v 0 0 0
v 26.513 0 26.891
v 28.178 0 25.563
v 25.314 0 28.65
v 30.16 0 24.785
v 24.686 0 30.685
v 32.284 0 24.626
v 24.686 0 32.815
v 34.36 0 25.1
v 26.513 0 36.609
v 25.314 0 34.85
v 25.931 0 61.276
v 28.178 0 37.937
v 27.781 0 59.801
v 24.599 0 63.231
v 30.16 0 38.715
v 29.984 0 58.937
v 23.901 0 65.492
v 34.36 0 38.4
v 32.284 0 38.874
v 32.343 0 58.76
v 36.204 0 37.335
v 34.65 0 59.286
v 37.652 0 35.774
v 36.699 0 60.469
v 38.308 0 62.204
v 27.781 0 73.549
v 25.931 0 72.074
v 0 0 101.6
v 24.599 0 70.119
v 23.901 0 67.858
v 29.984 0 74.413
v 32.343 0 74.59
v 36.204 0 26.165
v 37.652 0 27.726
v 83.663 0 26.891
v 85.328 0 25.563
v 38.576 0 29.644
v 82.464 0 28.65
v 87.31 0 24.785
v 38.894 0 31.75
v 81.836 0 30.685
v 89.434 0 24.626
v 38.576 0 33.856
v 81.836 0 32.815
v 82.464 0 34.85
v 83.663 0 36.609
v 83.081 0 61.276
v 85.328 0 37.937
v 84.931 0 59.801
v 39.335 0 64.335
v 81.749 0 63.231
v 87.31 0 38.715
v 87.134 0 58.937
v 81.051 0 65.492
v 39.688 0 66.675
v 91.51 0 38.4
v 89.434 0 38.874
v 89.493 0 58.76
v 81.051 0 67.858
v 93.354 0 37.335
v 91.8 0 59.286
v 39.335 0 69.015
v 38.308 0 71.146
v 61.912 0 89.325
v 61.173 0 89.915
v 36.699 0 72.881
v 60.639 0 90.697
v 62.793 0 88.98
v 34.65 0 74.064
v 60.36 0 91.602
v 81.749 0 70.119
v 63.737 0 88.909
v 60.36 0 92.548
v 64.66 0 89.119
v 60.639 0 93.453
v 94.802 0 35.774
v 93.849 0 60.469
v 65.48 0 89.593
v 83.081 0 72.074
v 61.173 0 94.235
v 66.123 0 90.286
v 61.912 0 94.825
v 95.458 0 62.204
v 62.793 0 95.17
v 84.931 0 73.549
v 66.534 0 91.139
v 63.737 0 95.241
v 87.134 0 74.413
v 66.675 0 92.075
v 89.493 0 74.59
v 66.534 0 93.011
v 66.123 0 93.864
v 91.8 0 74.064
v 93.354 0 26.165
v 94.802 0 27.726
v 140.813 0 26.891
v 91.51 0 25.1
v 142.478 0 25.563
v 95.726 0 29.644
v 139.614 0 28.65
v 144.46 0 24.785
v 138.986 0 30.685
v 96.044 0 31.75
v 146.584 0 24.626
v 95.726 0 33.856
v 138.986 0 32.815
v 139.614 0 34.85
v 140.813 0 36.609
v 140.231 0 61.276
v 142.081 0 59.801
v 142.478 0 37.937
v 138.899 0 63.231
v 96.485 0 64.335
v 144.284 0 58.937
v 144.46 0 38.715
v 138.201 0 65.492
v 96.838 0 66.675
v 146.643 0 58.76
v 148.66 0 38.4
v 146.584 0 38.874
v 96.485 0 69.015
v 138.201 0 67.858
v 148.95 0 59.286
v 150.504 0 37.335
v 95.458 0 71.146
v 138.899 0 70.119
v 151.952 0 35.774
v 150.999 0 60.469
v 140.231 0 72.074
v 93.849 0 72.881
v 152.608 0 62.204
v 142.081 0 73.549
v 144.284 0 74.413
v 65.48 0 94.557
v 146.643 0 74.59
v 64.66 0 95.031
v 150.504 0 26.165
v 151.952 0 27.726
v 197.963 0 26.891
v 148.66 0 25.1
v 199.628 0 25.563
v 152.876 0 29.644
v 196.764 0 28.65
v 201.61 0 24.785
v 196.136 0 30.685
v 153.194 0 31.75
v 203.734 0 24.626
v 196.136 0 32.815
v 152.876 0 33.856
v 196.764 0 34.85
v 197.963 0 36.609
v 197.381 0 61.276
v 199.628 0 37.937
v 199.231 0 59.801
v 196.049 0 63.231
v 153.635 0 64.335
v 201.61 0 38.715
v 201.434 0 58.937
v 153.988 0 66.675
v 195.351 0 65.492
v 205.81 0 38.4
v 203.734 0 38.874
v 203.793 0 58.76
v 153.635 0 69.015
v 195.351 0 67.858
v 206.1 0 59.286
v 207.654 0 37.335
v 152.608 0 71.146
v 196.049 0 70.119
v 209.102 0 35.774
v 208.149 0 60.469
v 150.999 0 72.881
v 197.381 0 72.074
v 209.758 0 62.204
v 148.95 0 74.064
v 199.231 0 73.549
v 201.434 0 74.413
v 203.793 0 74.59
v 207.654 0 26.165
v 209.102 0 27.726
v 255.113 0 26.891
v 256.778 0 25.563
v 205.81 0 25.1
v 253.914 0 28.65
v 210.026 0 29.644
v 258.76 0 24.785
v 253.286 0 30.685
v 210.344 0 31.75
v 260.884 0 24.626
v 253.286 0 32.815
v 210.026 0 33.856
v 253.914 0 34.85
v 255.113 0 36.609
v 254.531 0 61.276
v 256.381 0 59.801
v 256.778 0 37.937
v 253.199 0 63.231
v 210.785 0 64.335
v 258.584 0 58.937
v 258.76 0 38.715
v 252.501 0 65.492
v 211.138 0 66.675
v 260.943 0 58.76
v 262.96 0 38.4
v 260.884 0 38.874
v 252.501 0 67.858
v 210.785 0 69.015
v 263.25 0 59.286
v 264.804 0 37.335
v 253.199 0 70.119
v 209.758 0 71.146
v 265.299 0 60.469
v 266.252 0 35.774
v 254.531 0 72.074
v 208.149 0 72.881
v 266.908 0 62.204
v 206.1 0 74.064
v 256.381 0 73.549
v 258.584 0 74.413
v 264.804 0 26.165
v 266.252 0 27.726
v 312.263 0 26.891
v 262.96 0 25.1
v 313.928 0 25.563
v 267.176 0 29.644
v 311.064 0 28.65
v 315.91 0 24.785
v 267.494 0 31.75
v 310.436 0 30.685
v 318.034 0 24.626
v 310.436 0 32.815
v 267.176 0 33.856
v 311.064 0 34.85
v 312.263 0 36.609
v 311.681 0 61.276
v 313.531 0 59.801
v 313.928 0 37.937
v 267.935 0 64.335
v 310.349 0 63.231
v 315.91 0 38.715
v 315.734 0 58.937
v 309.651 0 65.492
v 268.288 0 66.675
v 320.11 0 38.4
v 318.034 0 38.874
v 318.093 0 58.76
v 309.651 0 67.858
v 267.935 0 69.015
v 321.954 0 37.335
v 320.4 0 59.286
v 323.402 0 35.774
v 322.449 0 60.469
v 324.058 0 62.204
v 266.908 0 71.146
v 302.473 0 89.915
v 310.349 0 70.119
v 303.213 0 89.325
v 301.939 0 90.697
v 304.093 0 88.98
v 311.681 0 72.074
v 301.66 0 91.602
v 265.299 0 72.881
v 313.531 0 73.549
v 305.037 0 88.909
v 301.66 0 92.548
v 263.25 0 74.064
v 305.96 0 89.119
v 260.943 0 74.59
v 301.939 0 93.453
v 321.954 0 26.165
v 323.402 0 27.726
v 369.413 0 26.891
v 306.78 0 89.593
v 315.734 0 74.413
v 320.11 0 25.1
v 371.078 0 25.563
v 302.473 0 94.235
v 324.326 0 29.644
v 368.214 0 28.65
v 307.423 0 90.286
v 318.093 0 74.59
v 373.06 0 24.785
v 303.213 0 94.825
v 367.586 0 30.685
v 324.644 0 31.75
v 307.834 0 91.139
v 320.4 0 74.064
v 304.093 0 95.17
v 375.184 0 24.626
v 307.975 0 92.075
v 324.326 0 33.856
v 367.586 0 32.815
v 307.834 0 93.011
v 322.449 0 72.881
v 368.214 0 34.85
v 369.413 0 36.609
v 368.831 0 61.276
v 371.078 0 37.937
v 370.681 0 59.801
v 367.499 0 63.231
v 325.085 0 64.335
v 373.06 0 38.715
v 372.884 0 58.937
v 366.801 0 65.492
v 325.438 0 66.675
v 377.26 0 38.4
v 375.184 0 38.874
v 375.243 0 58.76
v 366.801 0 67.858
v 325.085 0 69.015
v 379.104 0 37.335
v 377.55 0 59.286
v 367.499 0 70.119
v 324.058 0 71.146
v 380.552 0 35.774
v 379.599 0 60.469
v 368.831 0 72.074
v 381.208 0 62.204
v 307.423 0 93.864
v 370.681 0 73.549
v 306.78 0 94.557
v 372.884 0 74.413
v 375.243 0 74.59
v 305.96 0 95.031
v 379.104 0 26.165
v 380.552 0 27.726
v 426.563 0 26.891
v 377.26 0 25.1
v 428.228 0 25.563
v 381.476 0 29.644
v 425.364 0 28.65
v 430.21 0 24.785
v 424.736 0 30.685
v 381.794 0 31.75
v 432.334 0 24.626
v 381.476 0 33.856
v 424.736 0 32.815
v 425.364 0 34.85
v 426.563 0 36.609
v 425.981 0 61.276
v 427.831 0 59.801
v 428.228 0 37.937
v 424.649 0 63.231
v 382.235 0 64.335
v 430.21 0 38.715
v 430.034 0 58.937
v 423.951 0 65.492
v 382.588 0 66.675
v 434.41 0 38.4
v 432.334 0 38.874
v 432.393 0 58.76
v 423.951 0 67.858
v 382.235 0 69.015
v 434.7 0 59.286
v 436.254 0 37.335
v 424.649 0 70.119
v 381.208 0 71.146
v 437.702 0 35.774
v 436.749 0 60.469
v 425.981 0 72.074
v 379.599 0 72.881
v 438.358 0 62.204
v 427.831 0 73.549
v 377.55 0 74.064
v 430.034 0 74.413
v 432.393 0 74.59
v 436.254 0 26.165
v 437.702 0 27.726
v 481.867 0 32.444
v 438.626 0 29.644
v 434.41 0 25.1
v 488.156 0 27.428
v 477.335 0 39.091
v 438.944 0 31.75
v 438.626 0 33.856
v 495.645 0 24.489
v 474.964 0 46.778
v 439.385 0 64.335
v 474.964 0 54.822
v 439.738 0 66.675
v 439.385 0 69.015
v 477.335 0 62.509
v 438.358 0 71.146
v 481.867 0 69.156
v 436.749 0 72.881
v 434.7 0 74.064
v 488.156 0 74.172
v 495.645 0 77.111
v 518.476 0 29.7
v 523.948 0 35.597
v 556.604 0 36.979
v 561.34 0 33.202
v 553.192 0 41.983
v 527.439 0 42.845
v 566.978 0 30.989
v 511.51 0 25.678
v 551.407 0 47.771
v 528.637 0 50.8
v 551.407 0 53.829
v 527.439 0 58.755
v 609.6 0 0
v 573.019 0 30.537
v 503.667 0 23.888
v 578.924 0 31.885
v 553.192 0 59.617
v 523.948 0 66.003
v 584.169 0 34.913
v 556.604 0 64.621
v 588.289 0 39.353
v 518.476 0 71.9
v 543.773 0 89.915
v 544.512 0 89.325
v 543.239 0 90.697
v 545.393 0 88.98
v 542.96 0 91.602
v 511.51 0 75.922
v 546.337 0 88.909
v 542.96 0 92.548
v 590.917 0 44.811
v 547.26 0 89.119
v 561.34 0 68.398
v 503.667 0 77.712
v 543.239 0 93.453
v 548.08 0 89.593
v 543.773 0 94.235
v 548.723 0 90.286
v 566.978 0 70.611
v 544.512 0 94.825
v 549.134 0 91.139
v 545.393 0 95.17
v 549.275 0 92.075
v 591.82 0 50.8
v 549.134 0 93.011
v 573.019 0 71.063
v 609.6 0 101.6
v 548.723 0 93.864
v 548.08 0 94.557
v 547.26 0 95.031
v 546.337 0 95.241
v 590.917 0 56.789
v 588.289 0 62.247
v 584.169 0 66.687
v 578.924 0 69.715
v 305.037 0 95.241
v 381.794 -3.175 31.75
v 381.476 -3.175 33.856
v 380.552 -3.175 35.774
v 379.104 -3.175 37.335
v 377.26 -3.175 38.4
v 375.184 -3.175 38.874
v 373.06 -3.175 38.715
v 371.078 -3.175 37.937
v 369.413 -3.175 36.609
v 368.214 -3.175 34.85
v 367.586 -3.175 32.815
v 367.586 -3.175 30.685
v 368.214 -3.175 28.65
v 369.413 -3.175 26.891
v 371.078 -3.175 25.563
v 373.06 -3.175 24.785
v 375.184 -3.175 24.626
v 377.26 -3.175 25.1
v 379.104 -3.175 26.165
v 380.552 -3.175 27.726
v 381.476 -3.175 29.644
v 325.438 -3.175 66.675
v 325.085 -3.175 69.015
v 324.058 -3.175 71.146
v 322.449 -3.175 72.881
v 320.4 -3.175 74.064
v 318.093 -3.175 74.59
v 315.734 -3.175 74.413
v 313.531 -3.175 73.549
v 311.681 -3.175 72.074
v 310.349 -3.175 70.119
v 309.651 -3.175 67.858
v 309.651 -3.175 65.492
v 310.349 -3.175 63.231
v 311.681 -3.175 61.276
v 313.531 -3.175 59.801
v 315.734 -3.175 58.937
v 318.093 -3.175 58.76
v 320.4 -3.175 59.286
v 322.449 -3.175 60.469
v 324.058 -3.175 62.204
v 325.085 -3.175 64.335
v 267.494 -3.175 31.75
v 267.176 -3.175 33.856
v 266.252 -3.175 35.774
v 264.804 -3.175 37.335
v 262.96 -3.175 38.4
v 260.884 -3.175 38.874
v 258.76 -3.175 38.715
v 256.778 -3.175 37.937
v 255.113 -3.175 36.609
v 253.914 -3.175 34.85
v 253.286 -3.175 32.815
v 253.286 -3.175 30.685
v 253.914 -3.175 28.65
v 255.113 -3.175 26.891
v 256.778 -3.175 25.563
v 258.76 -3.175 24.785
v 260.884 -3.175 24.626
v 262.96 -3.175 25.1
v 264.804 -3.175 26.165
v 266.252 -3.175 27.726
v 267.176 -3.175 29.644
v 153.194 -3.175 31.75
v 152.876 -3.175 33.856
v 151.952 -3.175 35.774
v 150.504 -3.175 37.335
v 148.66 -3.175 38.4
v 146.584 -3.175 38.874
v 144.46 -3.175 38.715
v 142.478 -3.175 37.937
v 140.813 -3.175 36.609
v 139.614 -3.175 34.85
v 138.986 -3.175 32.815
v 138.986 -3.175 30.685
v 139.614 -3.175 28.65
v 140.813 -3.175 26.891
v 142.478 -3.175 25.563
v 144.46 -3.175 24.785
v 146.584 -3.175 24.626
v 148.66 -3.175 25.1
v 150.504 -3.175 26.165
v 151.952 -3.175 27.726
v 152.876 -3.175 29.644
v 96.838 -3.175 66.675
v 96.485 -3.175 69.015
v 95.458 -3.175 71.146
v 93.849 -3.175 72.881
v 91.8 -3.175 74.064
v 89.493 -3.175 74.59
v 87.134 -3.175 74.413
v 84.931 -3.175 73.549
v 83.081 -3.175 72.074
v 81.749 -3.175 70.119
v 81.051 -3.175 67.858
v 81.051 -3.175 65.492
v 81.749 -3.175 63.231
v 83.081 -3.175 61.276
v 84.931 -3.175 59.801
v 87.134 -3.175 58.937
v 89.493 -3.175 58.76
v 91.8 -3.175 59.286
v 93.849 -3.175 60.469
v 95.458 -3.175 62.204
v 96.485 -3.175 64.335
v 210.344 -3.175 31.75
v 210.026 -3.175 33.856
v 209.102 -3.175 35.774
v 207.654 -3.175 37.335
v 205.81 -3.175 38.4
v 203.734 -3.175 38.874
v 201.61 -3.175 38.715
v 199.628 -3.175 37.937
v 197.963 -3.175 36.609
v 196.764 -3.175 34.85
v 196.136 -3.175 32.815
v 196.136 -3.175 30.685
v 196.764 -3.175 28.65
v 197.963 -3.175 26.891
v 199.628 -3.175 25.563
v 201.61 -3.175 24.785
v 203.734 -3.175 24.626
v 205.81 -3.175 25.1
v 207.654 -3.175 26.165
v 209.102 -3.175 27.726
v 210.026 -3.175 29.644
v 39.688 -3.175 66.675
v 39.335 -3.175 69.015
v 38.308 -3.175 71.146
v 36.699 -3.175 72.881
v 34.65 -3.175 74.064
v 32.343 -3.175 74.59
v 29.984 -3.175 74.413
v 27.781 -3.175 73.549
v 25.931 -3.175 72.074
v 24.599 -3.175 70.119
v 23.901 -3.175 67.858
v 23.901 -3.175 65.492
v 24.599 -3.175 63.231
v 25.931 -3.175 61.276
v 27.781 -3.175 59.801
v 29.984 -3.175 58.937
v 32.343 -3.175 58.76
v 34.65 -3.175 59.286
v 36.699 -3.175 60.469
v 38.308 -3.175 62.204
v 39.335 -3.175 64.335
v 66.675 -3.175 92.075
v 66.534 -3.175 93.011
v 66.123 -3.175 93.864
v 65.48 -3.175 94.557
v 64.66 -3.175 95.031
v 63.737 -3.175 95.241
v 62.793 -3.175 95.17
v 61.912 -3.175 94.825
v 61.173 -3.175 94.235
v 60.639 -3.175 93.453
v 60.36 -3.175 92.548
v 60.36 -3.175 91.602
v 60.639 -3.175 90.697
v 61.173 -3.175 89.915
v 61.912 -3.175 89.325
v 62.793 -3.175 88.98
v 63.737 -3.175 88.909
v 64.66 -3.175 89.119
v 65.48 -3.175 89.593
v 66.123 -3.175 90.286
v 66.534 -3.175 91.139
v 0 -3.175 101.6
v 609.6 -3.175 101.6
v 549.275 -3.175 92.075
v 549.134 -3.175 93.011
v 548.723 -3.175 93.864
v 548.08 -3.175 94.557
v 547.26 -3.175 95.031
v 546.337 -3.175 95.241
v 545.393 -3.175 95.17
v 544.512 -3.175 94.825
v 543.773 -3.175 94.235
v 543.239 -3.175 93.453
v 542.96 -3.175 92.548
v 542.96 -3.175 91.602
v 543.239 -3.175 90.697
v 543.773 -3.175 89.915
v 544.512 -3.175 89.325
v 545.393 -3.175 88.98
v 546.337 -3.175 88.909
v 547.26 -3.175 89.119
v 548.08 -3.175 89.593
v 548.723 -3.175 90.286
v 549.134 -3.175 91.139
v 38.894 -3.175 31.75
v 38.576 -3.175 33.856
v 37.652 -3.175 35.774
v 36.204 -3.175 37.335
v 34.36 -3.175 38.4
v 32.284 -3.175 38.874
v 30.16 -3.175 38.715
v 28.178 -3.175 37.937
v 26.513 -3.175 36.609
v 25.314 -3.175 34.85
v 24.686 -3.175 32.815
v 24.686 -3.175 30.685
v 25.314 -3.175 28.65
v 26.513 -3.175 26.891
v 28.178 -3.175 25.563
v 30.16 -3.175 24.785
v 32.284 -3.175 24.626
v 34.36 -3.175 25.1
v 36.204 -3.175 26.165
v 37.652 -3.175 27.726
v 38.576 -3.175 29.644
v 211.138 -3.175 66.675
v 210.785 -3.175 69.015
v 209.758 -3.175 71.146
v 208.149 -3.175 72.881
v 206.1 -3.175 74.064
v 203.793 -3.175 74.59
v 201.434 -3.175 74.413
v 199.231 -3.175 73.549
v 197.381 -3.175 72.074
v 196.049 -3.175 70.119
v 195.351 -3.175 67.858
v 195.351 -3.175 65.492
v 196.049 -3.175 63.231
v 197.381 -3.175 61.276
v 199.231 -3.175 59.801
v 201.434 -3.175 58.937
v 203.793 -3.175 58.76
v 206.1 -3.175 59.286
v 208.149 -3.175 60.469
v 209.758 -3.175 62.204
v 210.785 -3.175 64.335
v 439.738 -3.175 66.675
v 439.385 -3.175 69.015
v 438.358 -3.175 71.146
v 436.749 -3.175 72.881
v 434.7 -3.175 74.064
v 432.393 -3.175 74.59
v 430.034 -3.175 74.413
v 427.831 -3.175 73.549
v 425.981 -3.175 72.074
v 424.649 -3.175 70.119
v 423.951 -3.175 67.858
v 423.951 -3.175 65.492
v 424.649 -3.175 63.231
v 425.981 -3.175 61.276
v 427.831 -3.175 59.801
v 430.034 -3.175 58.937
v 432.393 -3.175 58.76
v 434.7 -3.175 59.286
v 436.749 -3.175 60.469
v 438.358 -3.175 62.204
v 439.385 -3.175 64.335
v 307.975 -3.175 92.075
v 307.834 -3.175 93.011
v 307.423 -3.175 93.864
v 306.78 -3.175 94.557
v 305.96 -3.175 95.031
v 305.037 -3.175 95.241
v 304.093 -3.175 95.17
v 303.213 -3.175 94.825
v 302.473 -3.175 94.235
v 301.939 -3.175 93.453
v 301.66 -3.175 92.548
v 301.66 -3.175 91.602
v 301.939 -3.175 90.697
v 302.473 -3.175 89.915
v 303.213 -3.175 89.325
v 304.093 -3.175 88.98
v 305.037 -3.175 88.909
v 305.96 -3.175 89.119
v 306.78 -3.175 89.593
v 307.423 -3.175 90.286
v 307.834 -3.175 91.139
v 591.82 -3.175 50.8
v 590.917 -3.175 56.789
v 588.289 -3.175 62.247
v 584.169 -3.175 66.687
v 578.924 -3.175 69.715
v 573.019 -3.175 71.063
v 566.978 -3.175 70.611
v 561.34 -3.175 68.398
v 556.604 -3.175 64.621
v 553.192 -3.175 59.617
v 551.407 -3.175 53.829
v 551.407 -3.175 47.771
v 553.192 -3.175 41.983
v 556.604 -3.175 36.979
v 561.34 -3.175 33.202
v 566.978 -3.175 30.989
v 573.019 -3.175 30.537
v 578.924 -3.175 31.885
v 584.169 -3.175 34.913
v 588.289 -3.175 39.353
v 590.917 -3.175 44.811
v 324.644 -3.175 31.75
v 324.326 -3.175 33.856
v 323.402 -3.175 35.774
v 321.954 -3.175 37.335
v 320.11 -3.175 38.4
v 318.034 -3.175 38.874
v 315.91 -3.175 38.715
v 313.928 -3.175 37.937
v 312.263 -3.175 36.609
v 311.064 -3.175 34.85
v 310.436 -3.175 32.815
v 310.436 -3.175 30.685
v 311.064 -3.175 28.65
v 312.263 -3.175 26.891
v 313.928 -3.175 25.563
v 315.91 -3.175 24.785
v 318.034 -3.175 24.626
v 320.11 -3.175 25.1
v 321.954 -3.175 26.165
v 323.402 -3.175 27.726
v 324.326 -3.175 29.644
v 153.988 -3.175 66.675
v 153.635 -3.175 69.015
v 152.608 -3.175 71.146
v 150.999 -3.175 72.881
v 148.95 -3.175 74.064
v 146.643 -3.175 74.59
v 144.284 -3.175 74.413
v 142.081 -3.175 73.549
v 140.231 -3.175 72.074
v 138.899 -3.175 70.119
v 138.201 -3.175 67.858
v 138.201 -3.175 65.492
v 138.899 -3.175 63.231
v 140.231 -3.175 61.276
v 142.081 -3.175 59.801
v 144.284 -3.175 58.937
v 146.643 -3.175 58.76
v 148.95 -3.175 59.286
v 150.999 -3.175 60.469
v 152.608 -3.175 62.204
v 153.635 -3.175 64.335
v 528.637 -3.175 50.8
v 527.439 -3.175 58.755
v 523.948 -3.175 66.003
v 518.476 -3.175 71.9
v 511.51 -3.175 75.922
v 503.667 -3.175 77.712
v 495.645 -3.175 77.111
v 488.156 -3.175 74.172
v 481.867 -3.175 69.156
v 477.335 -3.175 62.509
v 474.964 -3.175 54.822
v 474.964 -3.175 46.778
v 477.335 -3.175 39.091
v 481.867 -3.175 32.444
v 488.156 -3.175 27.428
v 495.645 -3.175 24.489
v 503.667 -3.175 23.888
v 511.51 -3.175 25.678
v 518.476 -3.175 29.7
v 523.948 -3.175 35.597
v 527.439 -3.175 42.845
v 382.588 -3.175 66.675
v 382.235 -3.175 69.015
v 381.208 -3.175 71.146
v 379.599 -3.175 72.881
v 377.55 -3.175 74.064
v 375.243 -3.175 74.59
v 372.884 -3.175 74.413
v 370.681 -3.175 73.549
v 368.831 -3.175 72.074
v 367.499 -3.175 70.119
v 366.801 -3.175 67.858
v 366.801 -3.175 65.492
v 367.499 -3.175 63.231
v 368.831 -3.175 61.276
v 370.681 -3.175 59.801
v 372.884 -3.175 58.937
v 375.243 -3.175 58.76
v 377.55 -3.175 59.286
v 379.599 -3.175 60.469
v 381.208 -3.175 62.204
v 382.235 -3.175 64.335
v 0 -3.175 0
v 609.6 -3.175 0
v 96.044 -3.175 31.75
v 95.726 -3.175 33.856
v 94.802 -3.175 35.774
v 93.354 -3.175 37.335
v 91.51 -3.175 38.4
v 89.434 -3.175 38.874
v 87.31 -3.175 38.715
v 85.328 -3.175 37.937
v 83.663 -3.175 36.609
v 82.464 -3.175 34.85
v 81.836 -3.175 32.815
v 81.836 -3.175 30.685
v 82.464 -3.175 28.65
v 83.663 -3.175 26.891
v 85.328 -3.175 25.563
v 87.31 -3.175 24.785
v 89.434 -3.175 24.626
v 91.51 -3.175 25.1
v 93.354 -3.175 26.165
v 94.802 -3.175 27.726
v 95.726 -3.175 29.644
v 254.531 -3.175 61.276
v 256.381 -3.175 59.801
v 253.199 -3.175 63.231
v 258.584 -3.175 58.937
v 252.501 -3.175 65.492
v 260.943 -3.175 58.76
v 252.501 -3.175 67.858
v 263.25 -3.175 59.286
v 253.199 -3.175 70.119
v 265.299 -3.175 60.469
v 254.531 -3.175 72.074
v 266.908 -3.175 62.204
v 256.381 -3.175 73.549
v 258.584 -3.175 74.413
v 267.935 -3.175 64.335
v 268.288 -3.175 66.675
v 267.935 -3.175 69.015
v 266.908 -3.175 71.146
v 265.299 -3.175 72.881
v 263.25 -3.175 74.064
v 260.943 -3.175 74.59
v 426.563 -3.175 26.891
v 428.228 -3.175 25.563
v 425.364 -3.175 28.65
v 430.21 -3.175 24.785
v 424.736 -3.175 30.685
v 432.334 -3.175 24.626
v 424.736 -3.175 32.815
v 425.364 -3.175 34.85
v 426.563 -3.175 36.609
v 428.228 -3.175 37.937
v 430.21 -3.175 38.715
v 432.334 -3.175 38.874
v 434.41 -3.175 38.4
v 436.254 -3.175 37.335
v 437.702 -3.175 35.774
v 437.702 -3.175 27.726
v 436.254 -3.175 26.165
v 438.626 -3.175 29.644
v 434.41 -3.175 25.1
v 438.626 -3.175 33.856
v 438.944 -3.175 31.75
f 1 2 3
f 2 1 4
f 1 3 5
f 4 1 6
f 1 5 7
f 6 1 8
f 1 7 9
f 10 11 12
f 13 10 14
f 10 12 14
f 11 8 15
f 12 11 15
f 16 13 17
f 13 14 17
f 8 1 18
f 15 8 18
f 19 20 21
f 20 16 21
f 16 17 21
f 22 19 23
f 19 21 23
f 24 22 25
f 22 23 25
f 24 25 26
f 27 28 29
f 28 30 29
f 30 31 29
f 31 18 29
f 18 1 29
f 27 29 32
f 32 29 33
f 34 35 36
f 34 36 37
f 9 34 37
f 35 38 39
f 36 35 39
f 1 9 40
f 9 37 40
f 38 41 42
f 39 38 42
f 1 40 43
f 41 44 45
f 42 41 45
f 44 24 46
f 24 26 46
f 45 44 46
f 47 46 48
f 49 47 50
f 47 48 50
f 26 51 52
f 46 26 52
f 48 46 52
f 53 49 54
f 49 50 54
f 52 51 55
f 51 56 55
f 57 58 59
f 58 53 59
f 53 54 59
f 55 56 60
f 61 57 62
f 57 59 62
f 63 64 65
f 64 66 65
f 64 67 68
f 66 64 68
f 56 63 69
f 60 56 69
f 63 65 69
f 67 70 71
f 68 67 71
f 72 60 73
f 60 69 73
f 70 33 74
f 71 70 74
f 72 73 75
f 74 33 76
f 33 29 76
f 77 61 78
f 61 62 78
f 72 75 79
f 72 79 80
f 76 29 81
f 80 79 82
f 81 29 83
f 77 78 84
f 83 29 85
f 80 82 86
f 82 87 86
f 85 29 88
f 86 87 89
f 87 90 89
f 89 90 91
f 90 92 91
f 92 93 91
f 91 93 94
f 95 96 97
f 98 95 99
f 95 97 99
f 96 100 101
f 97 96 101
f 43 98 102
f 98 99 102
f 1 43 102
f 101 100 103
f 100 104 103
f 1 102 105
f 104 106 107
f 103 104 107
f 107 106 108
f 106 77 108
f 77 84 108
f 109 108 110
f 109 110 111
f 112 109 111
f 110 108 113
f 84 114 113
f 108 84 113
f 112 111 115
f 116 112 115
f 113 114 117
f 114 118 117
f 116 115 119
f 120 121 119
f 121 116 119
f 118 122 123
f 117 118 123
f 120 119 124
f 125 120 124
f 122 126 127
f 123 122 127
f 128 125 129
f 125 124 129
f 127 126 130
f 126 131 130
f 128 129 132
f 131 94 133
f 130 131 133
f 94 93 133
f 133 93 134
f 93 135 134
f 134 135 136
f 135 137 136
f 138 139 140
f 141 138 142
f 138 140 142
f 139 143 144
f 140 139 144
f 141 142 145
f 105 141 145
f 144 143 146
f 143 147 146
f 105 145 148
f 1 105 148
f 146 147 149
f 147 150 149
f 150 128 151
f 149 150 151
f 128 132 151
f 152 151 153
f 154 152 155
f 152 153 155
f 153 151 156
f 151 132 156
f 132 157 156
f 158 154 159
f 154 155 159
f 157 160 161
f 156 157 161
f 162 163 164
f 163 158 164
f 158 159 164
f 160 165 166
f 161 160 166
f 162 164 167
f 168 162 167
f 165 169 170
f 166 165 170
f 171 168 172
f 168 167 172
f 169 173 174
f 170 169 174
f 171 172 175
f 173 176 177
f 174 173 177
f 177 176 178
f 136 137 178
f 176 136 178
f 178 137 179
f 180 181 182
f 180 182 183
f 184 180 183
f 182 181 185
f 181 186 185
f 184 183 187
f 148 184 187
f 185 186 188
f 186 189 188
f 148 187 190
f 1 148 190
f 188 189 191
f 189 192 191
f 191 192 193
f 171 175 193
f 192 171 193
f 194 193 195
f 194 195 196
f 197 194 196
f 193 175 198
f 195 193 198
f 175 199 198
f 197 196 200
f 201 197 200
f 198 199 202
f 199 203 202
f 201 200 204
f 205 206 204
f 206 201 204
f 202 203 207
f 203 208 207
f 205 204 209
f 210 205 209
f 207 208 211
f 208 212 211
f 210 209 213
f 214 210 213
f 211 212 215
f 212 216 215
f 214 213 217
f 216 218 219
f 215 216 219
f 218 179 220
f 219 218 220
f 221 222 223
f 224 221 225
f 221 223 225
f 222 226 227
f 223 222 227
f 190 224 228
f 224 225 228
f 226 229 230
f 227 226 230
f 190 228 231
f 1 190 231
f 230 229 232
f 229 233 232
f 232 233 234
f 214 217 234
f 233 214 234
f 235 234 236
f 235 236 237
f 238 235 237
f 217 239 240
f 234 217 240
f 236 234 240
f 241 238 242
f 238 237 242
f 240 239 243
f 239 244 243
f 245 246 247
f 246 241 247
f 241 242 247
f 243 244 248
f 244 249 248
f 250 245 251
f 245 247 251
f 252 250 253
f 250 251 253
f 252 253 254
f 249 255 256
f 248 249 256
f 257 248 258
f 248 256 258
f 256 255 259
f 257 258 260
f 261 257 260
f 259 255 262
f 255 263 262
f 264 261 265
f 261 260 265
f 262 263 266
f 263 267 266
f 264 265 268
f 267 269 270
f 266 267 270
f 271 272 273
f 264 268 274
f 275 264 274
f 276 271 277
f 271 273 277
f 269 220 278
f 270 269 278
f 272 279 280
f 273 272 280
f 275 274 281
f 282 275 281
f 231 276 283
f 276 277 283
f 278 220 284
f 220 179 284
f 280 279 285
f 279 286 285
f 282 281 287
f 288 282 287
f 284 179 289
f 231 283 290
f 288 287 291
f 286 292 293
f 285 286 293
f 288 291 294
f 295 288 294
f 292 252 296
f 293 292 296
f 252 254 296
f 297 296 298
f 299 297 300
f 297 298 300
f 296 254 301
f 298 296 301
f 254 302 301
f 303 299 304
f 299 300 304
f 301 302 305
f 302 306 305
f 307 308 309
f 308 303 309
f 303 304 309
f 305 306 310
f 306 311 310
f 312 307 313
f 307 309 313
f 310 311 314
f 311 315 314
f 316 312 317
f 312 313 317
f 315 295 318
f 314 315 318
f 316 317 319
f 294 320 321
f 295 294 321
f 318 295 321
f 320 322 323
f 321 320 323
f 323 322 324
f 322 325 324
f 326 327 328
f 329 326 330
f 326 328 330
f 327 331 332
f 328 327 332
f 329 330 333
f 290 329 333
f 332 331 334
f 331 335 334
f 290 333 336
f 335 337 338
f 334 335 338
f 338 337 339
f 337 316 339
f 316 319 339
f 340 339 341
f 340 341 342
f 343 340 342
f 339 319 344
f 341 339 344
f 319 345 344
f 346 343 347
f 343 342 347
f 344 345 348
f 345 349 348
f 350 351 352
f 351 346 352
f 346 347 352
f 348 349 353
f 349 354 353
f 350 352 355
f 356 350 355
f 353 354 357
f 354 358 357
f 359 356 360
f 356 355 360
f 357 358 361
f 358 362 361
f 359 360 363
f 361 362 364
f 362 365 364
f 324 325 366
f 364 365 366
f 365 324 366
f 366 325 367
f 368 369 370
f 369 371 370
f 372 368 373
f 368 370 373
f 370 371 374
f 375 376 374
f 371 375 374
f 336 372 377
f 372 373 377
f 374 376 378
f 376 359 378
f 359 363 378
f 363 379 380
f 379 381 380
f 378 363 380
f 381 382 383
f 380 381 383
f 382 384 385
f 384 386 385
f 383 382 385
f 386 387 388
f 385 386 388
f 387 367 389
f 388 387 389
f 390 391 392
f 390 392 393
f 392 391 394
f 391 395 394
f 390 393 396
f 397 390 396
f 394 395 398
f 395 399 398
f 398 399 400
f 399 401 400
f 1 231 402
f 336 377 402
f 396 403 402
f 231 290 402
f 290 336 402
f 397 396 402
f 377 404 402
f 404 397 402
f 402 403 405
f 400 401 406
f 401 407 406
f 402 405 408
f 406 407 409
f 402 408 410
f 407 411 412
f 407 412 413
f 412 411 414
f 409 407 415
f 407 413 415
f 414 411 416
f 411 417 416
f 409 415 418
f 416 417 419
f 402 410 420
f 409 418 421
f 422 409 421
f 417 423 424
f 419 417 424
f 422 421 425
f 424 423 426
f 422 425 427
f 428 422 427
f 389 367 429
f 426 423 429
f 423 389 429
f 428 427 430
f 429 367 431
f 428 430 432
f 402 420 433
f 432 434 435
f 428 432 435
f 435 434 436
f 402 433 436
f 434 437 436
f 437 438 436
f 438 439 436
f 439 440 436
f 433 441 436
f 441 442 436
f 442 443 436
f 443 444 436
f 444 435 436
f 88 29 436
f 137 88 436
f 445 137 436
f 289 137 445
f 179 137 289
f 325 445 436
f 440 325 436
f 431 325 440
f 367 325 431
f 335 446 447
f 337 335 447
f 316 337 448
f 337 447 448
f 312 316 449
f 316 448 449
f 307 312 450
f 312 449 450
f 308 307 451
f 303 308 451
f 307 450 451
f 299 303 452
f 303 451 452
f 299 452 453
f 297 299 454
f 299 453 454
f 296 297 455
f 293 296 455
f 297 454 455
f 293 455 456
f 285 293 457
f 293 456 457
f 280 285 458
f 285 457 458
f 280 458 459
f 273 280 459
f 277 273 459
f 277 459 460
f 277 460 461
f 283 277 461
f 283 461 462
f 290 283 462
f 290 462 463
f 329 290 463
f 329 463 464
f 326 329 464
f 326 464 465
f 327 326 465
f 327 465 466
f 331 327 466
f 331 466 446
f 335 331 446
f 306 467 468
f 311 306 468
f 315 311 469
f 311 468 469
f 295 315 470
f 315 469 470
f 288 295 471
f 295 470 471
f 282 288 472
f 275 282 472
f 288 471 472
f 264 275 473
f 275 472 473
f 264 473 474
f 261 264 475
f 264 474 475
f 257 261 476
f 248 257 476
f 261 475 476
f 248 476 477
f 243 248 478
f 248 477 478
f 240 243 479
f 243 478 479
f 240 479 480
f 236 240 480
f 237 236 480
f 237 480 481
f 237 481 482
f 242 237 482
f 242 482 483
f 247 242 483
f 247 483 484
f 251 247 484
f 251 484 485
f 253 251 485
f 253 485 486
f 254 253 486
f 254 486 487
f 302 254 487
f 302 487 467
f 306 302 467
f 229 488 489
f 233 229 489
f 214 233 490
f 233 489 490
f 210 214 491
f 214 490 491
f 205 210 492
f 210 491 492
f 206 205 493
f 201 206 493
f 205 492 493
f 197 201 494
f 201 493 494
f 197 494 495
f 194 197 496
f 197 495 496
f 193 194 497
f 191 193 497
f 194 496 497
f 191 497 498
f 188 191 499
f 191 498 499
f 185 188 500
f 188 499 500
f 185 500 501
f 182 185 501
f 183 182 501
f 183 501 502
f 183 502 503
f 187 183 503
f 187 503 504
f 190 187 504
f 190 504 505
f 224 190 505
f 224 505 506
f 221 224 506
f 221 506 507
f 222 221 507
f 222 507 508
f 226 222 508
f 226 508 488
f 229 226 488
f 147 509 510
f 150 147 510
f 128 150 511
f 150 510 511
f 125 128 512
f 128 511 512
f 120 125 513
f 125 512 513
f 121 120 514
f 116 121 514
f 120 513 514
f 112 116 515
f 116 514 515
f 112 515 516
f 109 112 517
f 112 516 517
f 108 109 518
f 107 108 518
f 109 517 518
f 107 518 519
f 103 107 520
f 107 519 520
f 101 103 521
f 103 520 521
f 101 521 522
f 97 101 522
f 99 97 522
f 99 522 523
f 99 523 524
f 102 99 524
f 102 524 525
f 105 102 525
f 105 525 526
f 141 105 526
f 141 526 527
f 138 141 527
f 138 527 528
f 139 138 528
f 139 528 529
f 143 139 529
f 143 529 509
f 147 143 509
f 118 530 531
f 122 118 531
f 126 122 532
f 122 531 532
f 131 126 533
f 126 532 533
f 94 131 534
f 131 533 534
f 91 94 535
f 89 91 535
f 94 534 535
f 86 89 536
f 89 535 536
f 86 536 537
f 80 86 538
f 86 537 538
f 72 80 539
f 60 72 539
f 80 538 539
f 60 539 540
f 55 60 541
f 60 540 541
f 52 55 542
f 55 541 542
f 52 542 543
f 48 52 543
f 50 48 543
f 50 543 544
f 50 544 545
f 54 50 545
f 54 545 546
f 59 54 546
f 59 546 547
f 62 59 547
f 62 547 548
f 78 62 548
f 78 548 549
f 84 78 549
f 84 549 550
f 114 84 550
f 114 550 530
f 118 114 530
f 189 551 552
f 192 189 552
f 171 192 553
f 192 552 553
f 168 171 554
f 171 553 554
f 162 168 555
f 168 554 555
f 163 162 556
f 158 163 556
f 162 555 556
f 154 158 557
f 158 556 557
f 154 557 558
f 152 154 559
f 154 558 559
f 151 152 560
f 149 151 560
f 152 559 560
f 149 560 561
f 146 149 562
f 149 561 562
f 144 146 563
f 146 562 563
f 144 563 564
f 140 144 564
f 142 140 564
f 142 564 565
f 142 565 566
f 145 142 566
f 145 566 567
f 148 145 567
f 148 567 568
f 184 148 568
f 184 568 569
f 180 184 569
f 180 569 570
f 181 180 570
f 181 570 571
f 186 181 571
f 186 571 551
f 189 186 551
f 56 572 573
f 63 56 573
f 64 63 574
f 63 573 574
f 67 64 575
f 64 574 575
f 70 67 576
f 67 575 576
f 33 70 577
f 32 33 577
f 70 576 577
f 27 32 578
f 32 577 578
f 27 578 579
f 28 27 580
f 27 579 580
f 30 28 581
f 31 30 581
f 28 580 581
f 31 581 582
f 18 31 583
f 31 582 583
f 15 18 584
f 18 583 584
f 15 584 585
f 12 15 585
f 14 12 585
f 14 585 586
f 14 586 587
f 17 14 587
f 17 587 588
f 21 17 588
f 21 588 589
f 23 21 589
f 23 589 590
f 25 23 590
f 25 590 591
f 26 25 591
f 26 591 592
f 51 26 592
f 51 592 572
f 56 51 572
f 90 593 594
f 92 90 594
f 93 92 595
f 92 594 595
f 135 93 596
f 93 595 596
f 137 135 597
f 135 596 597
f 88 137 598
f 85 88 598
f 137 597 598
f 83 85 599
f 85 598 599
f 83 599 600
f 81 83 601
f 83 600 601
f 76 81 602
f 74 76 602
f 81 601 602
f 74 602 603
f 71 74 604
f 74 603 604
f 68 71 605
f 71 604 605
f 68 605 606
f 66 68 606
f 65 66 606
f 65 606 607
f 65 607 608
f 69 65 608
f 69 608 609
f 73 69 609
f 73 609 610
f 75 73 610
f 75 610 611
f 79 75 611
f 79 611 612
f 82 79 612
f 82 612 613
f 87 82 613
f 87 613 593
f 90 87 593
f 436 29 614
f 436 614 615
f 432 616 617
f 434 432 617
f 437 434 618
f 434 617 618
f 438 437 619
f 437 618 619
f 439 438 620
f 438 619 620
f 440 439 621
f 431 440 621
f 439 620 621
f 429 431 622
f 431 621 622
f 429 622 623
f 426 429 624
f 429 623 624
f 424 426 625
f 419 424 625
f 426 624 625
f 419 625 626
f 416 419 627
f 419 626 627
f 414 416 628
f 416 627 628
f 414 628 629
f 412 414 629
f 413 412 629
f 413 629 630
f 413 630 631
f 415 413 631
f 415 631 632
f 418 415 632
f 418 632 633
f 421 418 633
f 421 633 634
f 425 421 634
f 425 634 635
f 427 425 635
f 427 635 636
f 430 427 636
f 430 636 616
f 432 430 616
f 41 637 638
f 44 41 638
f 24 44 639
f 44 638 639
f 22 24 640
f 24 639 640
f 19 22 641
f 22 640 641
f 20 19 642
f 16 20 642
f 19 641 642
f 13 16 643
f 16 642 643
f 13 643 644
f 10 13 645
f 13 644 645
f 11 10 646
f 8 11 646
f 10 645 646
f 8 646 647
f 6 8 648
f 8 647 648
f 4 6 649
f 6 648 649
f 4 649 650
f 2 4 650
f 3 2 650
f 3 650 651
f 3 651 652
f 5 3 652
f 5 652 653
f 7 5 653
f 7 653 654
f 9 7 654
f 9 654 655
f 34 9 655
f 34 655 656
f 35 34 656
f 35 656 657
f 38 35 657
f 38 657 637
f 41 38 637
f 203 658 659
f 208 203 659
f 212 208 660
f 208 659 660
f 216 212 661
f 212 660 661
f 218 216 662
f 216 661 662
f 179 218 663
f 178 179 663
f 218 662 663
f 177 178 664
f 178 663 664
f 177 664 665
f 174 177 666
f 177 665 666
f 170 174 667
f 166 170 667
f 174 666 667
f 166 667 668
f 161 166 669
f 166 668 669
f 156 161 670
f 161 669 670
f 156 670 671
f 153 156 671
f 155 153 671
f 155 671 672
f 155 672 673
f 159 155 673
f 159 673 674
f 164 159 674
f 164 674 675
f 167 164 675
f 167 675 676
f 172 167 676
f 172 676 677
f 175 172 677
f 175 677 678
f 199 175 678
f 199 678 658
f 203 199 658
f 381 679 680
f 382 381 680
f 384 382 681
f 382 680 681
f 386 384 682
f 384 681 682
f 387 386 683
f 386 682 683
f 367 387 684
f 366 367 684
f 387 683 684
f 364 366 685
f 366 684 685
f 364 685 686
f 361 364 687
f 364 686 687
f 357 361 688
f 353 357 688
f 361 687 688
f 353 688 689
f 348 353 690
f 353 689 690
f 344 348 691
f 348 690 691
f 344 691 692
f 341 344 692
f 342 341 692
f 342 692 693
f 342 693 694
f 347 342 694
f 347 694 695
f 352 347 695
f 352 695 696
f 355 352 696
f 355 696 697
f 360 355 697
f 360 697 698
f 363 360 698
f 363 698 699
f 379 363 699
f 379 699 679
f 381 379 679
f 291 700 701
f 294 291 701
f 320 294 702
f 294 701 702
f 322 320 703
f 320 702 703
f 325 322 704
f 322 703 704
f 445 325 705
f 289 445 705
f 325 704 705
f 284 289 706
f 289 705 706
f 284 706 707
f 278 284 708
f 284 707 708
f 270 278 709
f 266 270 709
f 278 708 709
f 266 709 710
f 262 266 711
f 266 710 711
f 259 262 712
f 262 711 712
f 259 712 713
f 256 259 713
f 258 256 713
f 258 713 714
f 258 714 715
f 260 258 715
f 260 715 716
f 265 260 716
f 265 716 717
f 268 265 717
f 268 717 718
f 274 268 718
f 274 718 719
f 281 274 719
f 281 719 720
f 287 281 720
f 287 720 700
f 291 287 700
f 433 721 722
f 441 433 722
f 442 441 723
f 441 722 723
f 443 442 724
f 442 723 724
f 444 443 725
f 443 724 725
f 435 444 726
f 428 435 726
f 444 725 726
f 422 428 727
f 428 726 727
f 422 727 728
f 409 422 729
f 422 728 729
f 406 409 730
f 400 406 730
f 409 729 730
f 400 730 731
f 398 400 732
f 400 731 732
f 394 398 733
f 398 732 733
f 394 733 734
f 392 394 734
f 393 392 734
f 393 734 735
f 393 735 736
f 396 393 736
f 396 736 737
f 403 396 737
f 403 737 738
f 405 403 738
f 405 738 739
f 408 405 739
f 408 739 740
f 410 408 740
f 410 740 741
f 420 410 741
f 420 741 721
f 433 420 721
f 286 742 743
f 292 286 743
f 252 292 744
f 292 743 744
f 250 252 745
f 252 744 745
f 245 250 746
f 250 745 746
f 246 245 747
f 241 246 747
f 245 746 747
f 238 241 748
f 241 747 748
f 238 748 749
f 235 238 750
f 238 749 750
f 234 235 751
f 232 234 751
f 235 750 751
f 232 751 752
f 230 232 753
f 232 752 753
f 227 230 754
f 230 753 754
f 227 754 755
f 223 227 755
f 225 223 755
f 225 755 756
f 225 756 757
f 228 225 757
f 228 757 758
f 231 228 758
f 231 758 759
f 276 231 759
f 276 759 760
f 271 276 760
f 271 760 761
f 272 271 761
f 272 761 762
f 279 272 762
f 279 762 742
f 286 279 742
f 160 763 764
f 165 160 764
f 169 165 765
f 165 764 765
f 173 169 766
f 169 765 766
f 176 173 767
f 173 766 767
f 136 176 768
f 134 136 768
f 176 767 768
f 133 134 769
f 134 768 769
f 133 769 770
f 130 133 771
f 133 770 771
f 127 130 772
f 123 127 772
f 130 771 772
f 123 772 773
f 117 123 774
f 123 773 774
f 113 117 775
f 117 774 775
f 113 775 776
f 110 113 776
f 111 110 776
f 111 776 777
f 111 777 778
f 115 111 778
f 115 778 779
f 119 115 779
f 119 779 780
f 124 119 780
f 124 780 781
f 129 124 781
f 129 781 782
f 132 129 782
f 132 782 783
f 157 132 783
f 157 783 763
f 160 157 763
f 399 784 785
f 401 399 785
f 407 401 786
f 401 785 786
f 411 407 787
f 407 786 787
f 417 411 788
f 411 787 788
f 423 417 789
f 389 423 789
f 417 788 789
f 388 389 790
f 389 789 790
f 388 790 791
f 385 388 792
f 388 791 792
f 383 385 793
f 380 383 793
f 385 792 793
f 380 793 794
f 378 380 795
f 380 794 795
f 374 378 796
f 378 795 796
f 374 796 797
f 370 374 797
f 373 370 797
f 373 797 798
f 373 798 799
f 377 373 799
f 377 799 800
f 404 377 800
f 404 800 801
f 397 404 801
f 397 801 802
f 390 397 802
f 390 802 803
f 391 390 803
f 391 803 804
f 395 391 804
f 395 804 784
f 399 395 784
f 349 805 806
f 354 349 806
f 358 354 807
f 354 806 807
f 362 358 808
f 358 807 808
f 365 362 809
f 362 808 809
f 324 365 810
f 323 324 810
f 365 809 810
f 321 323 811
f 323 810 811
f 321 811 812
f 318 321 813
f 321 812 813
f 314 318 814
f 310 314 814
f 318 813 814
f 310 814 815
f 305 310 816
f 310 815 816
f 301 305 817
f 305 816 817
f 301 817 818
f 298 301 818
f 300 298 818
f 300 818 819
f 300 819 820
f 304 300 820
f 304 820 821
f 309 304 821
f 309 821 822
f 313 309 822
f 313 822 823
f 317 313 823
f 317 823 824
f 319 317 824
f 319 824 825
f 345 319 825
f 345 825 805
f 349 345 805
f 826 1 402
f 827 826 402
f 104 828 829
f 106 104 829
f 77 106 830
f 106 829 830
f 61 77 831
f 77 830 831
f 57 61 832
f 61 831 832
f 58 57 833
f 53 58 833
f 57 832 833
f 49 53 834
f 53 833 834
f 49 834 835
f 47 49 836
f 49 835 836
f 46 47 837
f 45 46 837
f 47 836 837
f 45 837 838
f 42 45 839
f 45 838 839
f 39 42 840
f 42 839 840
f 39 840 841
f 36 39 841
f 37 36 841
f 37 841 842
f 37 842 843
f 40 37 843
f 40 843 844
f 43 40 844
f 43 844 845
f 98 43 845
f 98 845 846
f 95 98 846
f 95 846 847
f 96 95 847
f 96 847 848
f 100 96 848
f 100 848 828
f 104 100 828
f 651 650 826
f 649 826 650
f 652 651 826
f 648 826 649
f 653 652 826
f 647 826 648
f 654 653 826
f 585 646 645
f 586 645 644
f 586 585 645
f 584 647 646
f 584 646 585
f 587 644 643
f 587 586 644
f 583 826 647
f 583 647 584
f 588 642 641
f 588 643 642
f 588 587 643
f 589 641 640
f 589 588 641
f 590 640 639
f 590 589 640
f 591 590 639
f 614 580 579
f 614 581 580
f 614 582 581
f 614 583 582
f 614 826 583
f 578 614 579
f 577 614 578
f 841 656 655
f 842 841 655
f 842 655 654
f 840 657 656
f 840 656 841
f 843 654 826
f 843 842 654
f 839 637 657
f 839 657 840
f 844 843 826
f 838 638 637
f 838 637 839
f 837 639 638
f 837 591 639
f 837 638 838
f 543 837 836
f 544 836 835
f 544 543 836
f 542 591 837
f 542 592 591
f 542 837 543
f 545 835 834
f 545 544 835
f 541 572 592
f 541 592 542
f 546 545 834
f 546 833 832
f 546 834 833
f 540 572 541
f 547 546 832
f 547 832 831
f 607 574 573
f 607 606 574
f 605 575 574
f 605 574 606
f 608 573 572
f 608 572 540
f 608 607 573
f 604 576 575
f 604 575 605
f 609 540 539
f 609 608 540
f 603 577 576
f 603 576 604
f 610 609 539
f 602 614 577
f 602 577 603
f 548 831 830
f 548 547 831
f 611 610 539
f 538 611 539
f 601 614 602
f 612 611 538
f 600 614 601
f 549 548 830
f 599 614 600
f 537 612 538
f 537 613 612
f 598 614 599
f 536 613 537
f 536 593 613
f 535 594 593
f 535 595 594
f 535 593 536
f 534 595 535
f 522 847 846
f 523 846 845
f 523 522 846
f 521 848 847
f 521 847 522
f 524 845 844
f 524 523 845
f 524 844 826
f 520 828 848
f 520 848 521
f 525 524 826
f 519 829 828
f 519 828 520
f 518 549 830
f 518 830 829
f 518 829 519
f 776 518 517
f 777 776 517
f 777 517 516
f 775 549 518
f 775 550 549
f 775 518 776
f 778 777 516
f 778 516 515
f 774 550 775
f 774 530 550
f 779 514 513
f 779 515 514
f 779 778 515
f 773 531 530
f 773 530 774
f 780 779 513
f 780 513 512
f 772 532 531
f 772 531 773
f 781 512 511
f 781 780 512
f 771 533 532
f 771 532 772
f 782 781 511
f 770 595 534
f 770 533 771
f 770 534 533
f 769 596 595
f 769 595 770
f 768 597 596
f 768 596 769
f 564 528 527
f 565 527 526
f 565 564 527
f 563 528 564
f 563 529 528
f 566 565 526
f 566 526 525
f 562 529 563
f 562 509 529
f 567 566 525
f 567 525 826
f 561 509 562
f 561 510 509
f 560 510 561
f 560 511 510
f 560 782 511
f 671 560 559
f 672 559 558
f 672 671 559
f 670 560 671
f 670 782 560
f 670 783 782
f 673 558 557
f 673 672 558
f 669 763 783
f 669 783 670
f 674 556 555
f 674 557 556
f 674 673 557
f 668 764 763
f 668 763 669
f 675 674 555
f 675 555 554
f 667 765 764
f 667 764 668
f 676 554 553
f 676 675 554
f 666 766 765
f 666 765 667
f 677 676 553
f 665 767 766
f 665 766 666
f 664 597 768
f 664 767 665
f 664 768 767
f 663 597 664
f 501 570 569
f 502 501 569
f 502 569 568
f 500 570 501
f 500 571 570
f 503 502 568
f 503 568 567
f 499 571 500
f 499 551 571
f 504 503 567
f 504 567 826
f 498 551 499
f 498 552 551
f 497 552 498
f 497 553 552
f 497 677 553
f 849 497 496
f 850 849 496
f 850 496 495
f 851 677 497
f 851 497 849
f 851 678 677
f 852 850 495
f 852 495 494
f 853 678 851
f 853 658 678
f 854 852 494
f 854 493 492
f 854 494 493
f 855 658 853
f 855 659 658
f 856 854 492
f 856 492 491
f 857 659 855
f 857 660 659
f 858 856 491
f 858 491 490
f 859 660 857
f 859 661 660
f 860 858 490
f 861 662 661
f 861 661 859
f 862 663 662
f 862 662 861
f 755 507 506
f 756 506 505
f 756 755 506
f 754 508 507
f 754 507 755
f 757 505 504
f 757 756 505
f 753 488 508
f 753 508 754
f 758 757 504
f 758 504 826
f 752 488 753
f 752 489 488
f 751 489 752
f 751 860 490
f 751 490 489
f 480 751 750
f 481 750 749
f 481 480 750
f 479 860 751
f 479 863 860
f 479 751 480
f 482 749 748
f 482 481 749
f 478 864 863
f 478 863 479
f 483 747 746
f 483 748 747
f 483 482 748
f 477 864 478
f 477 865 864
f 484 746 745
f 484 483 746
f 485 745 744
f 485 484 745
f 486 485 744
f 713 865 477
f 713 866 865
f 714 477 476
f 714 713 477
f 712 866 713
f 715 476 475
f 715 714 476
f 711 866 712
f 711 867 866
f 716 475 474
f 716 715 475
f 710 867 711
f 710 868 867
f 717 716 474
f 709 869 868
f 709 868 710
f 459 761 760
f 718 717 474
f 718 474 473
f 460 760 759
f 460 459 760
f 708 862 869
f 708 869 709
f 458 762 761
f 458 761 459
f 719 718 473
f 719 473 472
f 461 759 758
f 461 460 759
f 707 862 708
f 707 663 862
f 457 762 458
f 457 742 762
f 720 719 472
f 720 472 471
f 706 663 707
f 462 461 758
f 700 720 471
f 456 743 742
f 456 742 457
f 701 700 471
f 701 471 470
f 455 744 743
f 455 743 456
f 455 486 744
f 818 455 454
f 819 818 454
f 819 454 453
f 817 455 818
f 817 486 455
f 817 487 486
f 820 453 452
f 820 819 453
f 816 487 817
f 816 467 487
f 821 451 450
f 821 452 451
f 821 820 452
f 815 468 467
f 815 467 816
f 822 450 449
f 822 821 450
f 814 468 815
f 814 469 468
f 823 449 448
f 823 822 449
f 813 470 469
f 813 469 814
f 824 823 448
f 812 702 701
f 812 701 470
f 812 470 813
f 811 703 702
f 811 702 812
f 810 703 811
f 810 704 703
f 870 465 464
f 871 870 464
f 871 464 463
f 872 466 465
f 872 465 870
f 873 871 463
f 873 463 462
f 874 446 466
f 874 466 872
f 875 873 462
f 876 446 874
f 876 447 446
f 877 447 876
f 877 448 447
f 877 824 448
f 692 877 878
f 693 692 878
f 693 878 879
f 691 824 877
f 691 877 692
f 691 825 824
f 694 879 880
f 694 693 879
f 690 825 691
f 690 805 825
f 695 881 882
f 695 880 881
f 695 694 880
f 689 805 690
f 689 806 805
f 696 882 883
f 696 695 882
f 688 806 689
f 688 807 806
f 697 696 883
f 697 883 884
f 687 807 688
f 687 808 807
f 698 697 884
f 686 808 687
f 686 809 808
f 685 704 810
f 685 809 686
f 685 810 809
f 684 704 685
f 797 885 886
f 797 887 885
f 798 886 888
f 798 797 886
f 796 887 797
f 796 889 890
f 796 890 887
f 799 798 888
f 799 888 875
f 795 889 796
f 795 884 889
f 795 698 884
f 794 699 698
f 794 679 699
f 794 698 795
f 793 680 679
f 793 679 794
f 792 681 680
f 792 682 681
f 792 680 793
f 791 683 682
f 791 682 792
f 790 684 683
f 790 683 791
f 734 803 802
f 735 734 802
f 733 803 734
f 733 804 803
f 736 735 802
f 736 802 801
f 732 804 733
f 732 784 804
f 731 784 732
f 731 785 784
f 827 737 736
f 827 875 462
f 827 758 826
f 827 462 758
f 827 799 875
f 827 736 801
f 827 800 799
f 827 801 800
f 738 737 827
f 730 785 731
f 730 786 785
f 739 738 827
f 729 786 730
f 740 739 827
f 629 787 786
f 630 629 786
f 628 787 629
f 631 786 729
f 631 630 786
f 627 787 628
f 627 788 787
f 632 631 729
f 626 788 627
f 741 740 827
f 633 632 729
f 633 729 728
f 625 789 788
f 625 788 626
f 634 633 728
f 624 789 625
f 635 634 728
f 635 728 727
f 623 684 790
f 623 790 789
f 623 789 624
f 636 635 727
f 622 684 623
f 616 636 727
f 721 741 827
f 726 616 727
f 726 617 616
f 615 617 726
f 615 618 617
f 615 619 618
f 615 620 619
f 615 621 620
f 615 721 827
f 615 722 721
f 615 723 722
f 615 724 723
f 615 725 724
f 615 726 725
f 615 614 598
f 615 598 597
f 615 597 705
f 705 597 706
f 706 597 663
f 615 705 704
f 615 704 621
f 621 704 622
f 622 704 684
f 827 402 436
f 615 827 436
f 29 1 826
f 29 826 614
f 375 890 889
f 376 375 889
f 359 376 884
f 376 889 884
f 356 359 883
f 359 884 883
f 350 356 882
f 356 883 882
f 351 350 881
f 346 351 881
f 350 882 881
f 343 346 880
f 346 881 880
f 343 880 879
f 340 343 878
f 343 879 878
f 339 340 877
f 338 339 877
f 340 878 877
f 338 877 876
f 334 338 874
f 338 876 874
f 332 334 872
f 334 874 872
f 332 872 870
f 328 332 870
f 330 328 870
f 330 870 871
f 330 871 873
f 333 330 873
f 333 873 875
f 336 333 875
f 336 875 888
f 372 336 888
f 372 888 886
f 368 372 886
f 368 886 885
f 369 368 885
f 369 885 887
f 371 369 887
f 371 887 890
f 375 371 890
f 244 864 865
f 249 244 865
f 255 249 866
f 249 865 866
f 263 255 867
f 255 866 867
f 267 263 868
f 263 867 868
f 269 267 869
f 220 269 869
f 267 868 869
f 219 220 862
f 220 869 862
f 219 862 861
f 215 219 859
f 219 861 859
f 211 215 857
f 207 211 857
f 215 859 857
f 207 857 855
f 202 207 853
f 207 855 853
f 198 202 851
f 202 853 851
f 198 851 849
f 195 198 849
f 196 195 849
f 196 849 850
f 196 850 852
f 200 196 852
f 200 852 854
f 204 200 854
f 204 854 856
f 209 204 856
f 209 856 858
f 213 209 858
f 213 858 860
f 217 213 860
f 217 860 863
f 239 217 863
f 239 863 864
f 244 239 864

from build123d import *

# Parameters (mm, degrees)
F0_W      = 609.6
F0_H      = 101.6
F1_DEPTH  = 3.175
F2_R      = 7.14375
F3_DEPTH  = 3.176
F4_R      = 26.9875
F5_DEPTH  = 3.176
F6_R      = 20.32
F7_DEPTH  = 3.176
F8_R      = 7.9375
F9_DEPTH  = 3.176
F10_R     = 3.175
F11_DEPTH = 3.176


# Not quite as in the source:
# - a feature names something its author has since deleted; it is built from what else it names


with BuildPart() as f1:
    # F0 (on Front) → F1 (new body)
    with BuildSketch(Plane.XZ):
        with Locations((304.8, 50.8)):
            Rectangle(F0_W, F0_H)
    extrude(amount=F1_DEPTH)

    # F2 (on face) → F3 (cut, through all)
    with BuildSketch(Plane.XZ.offset(3.175)):
        with Locations((31.75, 31.75)):
            Circle(F2_R)
        with Locations((88.9, 31.75)):
            Circle(F2_R)
        with Locations((146.05, 31.75)):
            Circle(F2_R)
        with Locations((203.2, 31.75)):
            Circle(F2_R)
        with Locations((260.35, 31.75)):
            Circle(F2_R)
        with Locations((317.5, 31.75)):
            Circle(F2_R)
        with Locations((374.65, 31.75)):
            Circle(F2_R)
        with Locations((431.8, 31.75)):
            Circle(F2_R)
    extrude(amount=-F3_DEPTH, mode=Mode.SUBTRACT)

    # F4 (on face) → F5 (cut, through all)
    with BuildSketch(Plane.XZ.offset(3.175)):
        with Locations((501.65, 50.8)):
            Circle(F4_R)
    extrude(amount=-F5_DEPTH, mode=Mode.SUBTRACT)

    # F6 (on face) → F7 (cut, through all)
    with BuildSketch(Plane.XZ.offset(3.175)):
        with Locations((571.5, 50.8)):
            Circle(F6_R)
    extrude(amount=-F7_DEPTH, mode=Mode.SUBTRACT)

    # F8 (on face) → F9 (cut, through all)
    with BuildSketch(Plane.XZ.offset(3.175)):
        with Locations((31.75, 66.675)):
            Circle(F8_R)
        with Locations((88.9, 66.675)):
            Circle(F8_R)
        with Locations((146.05, 66.675)):
            Circle(F8_R)
        with Locations((203.2, 66.675)):
            Circle(F8_R)
        with Locations((260.35, 66.675)):
            Circle(F8_R)
        with Locations((317.5, 66.675)):
            Circle(F8_R)
        with Locations((374.65, 66.675)):
            Circle(F8_R)
        with Locations((431.8, 66.675)):
            Circle(F8_R)
    extrude(amount=-F9_DEPTH, mode=Mode.SUBTRACT)

    # F10 (on face) → F11 (cut, through all)
    with BuildSketch(Plane.XZ.offset(3.175)):
        with Locations((63.5, 92.075)):
            Circle(F10_R)
        with Locations((304.8, 92.075)):
            Circle(F10_R)
        with Locations((546.1, 92.075)):
            Circle(F10_R)
    extrude(amount=-F11_DEPTH, mode=Mode.SUBTRACT)


solid = f1.part
